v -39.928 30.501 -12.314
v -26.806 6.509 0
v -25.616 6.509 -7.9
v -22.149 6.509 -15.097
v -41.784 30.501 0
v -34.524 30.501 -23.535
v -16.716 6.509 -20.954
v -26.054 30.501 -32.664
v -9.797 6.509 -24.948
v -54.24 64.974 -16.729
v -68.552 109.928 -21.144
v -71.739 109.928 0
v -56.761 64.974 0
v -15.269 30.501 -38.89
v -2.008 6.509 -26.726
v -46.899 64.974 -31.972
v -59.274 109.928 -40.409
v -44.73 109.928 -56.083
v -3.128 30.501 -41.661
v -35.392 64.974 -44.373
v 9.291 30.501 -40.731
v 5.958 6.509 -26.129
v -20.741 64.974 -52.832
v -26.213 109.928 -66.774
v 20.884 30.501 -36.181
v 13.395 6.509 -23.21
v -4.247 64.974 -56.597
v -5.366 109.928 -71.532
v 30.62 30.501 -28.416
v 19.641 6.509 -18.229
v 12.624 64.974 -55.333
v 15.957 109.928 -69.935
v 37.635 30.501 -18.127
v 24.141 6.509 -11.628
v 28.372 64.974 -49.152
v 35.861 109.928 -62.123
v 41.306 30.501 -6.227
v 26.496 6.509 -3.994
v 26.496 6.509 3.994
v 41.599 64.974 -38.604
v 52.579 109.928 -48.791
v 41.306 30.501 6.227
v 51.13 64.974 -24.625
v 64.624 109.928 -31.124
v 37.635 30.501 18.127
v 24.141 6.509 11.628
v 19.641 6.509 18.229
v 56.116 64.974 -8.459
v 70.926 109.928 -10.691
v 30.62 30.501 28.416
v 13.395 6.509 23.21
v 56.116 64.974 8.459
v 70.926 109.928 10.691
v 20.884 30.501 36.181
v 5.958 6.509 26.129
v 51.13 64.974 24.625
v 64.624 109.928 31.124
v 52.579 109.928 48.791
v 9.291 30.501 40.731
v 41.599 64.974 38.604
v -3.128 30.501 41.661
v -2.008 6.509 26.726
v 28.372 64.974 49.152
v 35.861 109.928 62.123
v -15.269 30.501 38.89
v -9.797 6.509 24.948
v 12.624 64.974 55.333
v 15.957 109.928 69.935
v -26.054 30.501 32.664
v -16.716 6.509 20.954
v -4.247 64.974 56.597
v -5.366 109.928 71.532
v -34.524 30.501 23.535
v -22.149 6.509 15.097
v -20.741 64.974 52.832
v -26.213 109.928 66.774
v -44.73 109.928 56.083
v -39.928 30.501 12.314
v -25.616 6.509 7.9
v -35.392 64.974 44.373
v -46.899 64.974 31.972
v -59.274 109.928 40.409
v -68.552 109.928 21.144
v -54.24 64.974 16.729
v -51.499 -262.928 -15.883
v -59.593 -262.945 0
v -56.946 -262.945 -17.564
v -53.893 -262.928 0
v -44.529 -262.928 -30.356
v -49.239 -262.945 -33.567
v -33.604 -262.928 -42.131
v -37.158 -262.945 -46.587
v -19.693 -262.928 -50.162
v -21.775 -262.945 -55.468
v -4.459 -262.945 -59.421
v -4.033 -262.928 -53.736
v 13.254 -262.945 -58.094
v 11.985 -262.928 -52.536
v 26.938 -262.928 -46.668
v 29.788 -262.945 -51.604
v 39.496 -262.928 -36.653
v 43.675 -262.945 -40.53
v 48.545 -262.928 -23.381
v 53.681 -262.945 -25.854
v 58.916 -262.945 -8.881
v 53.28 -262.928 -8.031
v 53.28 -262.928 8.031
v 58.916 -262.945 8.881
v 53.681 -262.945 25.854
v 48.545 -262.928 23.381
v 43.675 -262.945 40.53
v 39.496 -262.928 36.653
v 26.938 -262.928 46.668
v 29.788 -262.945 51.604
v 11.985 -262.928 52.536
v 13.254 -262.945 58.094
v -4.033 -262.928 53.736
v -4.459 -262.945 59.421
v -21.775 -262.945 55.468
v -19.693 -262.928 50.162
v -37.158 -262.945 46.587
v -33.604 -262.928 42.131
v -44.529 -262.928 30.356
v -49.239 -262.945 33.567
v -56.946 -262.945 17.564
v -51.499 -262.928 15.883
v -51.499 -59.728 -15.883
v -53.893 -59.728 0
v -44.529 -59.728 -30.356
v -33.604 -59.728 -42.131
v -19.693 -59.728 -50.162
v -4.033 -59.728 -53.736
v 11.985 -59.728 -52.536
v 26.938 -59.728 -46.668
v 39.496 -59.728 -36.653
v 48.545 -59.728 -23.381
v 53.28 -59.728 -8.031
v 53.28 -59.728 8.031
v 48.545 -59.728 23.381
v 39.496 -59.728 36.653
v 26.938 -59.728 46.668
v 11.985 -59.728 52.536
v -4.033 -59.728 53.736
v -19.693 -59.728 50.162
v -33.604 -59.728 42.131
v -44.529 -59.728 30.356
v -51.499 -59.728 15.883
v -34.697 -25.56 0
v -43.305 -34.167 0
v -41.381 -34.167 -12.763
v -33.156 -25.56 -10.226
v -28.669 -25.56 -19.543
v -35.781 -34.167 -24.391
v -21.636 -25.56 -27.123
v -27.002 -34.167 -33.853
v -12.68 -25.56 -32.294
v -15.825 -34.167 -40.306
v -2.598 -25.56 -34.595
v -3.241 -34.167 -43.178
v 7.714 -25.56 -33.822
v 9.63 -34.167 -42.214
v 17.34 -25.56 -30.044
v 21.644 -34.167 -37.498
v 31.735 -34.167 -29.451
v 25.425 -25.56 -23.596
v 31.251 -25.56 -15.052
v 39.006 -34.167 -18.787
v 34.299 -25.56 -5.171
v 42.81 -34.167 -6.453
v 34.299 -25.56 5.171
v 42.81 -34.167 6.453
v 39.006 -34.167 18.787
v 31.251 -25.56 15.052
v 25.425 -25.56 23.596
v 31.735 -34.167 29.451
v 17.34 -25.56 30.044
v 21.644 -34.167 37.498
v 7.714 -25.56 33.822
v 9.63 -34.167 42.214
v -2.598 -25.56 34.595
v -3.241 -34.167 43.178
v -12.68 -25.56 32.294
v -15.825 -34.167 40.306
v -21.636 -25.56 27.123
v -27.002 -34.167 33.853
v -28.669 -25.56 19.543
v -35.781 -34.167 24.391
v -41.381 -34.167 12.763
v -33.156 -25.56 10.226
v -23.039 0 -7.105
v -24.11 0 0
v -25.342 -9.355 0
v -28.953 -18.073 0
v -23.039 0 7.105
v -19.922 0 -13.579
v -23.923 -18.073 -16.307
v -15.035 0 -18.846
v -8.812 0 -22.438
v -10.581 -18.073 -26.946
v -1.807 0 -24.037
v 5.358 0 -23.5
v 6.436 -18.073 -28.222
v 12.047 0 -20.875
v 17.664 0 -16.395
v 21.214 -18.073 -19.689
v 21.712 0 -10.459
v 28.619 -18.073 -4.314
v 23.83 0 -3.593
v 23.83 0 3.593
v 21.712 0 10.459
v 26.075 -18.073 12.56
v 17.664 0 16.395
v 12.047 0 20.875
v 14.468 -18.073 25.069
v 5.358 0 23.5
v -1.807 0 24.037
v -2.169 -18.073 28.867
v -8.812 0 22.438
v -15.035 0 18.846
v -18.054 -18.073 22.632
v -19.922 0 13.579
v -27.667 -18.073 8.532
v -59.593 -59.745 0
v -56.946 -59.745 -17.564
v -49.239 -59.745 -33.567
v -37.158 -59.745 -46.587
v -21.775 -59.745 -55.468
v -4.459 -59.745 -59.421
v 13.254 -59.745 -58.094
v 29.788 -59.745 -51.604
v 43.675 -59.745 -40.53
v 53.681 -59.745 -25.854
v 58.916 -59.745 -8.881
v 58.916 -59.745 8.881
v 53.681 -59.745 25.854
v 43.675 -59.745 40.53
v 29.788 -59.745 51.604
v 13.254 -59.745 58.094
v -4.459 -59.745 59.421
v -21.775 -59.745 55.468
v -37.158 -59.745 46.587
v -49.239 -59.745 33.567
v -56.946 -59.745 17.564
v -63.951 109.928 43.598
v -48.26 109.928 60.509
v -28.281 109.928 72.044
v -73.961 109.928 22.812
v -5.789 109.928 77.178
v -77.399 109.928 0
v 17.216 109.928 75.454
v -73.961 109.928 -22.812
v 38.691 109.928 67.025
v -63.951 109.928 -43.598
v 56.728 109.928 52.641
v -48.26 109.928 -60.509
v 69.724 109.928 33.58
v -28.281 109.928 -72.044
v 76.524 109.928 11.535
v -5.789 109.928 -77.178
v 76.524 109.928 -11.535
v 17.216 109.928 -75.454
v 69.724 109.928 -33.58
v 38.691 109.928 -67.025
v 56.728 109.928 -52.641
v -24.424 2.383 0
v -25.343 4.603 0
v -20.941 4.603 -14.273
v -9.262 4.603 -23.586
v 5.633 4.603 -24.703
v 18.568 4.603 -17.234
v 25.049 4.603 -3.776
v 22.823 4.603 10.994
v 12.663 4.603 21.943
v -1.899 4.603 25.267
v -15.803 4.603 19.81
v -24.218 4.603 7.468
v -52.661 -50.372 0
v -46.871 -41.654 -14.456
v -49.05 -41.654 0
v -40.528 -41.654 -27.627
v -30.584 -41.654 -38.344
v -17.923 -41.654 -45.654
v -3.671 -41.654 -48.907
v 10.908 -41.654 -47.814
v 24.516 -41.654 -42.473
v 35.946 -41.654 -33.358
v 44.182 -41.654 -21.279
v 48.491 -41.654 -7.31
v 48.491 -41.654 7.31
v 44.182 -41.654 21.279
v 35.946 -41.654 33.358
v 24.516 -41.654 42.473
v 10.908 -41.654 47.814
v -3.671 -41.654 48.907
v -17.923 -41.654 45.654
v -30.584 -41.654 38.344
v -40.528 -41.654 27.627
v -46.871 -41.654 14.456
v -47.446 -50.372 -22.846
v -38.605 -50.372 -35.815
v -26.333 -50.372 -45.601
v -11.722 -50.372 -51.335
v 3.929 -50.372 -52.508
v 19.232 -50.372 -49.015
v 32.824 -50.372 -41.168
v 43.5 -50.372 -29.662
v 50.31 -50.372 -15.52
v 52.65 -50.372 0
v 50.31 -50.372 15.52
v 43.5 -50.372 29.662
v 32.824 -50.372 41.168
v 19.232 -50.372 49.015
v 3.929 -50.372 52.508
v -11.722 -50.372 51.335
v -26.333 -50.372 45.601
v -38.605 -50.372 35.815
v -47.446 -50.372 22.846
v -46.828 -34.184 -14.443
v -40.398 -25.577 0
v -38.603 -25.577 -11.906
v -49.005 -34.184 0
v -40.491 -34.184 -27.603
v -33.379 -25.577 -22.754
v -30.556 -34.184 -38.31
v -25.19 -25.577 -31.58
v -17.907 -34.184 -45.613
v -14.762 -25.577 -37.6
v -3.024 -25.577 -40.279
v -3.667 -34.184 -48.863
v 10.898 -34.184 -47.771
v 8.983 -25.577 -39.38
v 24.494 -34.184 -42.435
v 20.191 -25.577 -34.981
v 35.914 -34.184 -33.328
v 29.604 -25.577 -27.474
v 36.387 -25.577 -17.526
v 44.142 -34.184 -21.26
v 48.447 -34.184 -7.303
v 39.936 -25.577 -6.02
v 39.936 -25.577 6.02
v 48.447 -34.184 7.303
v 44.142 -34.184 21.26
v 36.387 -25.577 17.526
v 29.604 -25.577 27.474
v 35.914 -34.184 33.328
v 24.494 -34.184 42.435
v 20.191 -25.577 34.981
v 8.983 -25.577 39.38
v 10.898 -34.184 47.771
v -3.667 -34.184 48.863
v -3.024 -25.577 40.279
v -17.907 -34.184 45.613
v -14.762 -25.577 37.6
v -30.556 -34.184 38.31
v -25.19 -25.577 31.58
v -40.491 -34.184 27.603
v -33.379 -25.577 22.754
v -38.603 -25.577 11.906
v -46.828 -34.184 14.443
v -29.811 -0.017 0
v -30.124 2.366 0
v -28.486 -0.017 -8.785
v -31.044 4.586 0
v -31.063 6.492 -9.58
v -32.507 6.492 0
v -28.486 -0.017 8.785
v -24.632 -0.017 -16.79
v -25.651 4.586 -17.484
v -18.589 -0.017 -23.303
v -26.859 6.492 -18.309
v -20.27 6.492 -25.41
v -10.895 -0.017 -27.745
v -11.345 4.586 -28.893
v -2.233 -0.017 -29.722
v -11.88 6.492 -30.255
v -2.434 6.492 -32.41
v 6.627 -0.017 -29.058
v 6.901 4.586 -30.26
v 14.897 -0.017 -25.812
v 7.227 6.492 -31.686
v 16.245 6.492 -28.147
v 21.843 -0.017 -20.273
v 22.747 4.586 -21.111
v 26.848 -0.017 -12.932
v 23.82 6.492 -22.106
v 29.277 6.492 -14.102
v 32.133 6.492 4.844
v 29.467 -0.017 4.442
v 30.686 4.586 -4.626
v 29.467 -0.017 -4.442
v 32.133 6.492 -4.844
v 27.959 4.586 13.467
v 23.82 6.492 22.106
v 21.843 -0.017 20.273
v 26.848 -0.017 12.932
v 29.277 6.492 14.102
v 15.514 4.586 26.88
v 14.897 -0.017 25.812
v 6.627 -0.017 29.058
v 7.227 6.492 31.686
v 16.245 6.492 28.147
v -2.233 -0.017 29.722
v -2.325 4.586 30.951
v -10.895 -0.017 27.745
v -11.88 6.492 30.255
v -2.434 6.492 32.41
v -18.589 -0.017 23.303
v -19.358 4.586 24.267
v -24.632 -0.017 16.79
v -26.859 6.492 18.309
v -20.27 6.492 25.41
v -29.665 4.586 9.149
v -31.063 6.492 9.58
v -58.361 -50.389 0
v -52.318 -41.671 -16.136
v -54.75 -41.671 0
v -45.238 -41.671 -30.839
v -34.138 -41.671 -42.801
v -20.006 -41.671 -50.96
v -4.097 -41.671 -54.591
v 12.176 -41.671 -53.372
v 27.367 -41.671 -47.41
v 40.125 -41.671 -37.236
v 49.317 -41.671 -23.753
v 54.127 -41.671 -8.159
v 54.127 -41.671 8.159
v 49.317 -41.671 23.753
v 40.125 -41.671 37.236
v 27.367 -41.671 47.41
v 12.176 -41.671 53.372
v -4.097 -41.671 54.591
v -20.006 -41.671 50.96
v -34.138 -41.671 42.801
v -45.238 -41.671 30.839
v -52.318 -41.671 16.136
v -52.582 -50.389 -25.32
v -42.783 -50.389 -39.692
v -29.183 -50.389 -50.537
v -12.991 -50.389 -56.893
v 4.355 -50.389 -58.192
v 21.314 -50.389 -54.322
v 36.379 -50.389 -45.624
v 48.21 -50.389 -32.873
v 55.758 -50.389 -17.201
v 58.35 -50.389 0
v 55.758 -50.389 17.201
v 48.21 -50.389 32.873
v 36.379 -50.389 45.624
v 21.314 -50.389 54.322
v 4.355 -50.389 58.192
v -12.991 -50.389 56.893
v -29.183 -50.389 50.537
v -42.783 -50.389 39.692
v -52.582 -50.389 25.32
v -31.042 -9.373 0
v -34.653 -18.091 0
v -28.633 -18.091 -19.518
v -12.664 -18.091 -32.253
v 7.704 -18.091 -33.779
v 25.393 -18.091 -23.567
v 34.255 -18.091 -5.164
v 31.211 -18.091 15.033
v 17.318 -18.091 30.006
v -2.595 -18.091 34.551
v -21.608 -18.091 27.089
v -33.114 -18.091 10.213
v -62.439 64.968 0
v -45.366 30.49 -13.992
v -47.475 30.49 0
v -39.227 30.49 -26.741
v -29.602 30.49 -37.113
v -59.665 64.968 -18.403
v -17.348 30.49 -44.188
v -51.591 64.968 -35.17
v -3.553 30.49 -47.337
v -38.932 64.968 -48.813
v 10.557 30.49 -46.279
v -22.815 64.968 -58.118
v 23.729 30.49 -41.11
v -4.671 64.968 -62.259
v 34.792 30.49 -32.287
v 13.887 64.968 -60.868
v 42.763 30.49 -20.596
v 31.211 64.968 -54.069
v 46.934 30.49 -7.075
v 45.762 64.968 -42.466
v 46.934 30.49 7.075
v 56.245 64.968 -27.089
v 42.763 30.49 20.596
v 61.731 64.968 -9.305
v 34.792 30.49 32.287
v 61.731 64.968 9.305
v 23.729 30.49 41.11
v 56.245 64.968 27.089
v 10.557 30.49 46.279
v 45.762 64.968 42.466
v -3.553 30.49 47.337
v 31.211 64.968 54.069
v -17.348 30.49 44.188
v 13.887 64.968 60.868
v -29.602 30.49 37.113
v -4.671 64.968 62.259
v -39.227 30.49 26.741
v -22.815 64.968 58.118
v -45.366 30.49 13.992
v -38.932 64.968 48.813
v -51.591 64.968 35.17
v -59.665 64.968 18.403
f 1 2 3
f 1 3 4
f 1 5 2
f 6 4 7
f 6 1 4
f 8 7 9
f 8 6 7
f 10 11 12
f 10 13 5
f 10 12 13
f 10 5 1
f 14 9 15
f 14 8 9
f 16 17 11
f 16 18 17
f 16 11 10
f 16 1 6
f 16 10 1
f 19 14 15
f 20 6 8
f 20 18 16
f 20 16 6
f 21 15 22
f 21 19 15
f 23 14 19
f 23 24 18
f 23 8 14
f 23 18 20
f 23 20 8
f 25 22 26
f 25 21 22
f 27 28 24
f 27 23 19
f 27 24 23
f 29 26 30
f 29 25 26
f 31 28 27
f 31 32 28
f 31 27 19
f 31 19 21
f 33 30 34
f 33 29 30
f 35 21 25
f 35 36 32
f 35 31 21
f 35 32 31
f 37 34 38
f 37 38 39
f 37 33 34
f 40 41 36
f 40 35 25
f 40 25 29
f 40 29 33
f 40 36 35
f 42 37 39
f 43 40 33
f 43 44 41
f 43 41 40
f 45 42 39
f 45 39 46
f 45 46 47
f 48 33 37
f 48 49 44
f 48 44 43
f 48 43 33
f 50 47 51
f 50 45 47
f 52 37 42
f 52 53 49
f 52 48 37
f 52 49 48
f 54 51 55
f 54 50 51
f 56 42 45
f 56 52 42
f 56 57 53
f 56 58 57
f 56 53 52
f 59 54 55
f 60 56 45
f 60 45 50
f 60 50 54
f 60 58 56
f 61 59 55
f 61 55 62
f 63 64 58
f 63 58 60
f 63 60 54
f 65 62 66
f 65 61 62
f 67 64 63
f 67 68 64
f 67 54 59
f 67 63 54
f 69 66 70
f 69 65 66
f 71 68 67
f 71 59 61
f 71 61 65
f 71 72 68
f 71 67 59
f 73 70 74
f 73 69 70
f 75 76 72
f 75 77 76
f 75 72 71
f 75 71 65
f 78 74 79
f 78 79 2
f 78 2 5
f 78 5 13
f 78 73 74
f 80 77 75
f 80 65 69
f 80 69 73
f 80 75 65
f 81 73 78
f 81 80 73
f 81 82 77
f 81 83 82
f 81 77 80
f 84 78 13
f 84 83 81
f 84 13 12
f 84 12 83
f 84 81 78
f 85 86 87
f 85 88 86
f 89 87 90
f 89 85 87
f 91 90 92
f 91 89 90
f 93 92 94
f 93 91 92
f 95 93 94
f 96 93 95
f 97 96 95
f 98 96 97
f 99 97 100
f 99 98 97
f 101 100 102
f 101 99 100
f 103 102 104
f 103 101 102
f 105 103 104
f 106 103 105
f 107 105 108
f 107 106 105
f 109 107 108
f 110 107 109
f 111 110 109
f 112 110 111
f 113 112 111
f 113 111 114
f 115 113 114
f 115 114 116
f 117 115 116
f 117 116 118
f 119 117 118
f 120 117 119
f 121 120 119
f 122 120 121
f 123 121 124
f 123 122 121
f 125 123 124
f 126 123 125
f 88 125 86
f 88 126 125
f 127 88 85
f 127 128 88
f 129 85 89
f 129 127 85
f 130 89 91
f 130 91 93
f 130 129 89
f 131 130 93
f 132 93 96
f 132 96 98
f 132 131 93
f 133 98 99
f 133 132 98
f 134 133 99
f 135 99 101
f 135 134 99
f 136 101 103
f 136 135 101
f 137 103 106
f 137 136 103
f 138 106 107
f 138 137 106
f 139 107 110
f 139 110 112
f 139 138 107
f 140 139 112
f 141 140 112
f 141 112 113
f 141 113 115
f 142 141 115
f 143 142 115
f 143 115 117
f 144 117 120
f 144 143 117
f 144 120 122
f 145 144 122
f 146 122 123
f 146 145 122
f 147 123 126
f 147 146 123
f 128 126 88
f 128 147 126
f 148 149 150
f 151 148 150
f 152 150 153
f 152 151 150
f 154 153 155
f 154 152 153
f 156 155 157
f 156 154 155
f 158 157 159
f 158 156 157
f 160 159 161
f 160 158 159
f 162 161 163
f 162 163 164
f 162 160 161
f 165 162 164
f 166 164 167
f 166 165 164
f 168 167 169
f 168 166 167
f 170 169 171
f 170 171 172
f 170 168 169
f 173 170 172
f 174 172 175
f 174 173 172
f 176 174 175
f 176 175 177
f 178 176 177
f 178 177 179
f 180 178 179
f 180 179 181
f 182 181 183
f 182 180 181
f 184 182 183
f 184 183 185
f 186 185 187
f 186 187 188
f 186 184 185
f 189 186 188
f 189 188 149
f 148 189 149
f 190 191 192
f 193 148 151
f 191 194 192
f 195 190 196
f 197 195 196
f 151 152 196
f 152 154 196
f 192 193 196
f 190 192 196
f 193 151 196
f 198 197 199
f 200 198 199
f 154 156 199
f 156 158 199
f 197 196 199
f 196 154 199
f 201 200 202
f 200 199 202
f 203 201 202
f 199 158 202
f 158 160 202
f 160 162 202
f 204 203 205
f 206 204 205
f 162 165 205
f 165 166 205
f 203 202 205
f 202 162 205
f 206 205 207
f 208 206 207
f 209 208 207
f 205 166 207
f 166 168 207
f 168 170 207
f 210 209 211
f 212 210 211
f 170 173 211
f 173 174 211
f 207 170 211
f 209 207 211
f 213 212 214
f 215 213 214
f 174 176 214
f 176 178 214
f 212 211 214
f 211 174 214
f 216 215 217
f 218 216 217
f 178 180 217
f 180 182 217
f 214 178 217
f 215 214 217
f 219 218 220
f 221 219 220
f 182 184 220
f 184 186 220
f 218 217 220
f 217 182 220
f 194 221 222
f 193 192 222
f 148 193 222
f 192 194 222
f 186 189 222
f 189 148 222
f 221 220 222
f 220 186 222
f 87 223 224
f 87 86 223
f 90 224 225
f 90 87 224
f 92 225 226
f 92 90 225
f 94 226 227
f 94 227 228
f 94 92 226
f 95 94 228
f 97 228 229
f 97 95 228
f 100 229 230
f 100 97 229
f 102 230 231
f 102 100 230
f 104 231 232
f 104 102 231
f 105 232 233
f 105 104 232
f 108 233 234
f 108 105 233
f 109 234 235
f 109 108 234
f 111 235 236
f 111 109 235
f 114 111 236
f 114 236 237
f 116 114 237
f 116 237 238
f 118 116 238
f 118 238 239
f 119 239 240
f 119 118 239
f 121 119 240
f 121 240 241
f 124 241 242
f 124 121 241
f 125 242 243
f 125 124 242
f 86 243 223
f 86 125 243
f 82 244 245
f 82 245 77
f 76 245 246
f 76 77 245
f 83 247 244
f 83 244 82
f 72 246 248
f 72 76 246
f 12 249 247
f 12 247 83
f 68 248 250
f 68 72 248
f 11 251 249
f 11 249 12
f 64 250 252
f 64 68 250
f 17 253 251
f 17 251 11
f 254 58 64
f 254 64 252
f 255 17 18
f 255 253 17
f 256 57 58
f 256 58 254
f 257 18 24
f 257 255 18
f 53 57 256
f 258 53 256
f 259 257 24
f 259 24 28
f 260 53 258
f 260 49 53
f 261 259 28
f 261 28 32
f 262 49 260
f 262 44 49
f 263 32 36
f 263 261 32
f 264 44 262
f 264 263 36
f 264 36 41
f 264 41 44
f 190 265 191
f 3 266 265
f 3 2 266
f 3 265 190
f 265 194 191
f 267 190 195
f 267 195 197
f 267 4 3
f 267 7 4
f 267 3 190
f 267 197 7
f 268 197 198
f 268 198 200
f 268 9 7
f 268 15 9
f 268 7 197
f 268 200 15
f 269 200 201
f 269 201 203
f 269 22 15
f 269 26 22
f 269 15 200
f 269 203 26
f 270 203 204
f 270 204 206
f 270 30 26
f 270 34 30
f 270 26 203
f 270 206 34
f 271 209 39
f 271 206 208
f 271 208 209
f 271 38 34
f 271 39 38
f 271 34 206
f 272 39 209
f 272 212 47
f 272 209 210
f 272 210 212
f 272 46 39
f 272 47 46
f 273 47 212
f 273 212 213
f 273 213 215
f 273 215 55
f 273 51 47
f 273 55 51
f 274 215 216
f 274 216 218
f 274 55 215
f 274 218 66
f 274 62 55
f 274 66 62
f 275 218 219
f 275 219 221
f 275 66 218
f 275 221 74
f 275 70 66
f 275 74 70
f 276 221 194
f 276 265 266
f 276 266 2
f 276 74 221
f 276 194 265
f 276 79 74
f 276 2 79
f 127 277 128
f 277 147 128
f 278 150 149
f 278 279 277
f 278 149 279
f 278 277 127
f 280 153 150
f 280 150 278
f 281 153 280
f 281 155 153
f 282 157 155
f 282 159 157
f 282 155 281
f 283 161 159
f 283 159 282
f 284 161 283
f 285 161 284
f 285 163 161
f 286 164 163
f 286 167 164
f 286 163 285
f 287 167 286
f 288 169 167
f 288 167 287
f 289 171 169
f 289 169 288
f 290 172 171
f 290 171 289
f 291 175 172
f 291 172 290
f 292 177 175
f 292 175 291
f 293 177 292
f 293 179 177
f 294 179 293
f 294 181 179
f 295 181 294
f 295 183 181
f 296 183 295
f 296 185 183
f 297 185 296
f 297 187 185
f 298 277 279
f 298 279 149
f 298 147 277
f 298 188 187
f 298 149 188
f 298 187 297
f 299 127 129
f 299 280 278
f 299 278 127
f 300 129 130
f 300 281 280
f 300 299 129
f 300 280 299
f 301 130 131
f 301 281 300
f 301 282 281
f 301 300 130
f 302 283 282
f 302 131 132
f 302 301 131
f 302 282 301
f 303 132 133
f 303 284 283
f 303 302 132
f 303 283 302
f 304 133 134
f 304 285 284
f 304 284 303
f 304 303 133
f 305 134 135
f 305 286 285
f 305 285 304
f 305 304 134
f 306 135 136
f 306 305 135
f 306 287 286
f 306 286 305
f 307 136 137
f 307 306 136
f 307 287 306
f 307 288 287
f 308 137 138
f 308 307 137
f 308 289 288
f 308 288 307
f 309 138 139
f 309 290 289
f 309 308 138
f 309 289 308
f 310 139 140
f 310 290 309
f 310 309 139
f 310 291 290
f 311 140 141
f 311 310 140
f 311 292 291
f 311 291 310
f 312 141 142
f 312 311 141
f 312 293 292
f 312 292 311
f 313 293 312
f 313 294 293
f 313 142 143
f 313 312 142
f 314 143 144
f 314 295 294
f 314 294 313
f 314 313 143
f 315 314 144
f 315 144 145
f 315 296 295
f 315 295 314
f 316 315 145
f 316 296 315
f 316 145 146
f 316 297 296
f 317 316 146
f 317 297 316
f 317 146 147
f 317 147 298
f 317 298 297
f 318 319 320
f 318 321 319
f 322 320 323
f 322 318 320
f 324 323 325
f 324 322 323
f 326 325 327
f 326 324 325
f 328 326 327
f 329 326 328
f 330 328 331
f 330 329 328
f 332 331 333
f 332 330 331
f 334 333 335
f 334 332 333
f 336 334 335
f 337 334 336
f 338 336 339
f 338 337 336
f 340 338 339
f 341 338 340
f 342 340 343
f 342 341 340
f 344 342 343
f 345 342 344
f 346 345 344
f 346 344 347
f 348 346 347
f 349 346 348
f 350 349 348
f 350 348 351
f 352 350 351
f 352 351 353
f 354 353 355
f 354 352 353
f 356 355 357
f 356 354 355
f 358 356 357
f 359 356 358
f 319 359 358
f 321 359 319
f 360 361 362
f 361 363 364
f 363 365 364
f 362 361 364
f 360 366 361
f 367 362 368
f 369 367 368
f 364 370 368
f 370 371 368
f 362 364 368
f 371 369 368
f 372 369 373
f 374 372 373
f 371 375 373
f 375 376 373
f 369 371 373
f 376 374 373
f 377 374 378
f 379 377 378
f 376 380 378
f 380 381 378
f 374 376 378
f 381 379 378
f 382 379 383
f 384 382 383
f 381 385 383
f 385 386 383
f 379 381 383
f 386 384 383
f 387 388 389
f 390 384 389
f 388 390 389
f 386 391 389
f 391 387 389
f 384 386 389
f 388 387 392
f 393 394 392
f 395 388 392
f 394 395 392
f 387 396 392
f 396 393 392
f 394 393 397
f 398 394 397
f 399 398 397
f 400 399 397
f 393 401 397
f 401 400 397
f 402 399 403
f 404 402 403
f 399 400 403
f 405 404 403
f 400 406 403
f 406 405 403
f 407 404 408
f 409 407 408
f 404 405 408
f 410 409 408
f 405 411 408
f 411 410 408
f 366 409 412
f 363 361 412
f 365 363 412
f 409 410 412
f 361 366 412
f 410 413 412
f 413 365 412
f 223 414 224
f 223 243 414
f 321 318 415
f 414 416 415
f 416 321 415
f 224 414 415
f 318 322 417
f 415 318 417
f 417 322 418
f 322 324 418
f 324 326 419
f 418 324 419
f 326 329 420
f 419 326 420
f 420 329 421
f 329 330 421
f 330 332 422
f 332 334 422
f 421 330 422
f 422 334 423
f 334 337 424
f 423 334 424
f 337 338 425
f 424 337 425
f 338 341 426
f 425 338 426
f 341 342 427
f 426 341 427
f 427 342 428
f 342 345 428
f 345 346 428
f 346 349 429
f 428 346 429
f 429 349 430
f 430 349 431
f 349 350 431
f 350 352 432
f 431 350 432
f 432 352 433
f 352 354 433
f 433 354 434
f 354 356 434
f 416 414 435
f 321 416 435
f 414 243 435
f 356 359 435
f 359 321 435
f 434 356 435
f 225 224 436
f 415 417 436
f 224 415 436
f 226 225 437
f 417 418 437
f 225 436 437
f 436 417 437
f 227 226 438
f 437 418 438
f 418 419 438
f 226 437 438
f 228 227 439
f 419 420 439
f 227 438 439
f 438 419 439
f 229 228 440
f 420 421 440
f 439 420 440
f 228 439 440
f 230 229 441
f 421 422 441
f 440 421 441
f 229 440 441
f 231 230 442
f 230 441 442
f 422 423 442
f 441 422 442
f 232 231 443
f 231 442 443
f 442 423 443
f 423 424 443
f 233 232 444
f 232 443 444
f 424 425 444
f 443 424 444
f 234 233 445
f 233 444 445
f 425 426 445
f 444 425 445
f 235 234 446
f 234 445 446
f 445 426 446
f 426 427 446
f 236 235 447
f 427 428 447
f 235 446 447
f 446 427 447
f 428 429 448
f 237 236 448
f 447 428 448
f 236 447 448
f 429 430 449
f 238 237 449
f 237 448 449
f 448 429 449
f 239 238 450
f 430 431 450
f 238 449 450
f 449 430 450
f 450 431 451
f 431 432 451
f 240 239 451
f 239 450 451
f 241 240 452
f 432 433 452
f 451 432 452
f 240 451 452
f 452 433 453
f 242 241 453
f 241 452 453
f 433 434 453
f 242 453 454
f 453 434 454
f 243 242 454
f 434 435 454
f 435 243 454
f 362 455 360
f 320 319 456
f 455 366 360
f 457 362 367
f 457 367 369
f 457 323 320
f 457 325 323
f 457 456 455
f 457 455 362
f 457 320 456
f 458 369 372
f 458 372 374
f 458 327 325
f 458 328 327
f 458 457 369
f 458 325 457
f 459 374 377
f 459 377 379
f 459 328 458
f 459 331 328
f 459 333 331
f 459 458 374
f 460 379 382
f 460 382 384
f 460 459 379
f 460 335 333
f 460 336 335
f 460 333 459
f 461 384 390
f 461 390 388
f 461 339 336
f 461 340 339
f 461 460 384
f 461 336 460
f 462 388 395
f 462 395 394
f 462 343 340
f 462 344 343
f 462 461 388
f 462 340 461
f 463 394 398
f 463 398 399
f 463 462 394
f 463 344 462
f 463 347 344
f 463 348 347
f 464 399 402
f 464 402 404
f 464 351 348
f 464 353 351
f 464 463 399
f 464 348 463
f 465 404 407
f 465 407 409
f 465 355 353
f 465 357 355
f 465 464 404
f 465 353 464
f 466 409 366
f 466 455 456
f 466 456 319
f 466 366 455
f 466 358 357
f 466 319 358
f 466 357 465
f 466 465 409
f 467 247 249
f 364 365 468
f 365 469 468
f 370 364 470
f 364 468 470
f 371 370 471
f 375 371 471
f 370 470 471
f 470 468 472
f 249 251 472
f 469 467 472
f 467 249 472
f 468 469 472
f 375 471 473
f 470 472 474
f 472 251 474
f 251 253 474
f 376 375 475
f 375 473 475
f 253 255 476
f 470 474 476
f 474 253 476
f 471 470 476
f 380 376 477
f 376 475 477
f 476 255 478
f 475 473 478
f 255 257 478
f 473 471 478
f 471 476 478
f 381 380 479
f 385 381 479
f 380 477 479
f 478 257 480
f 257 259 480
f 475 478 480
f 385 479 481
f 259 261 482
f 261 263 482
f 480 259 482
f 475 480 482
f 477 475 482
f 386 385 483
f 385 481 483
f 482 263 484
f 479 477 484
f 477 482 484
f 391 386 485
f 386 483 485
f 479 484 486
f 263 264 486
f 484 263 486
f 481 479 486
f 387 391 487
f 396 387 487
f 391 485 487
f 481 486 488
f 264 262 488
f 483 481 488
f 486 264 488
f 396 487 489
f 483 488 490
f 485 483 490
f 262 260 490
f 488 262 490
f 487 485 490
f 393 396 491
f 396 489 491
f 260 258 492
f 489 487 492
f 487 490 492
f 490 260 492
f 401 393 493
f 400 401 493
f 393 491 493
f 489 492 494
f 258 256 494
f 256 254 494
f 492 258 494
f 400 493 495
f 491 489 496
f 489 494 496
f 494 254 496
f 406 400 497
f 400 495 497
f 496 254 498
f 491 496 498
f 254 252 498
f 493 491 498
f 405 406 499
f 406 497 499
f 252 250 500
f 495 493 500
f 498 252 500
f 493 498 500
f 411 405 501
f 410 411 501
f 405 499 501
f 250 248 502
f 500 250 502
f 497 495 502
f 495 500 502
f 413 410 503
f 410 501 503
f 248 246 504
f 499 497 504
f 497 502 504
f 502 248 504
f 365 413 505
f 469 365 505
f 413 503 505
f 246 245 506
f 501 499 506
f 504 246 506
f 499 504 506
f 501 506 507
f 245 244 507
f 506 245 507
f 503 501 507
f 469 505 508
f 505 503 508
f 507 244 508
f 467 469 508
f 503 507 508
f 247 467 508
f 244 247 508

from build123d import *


with BuildPart() as part:
    # Sketch1 → Revolve2 (revolve)
    with BuildSketch(Plane.XY, mode=Mode.PRIVATE) as revolve2_sk:
        with BuildLine():
            Line((71.727523603, 109.92750764), (77.388416165, 109.92750764))
            add(Edge.make_bspline(
                [(32.495712479, 6.492229985), (54.951080007, 34.627531396), (77.388416165, 109.92750764)],
                knots=[0, 0, 0, 1, 1, 1], degree=2))
            add(Edge.make_bspline(
                [(29.79950115, -0.017009666), (29.799501776, 0.018882986), (29.800039607, 0.093104024), (29.802456999, 0.250631404), (29.808894844, 0.410054451), (29.820966875, 0.629754601), (29.841868363, 0.884423662), (29.875617995, 1.185527607), (29.926932581, 1.525040832), (29.990976977, 1.863987111), (30.067574877, 2.199344754), (30.156756847, 2.532229755), (30.258174689, 2.861082979), (30.372052346, 3.186337375), (30.497630047, 3.506617491), (30.635719253, 3.822657067), (30.784503576, 4.132272519), (30.946445498, 4.437773457), (31.11692178, 4.73429191), (31.302947997, 5.028694196), (31.492221546, 5.30850927), (31.70483875, 5.593717877), (31.87930965, 5.815903982), (32.066779032, 6.032941971), (32.204988524, 6.19163198), (32.370875346, 6.365112113), (32.444953537, 6.441469176), (32.495712479, 6.492229985)],
                knots=[0.082568816, 0.082568816, 0.082568816, 0.082568816, 0.082568816, 0.102426634, 0.122284453, 0.142142271, 0.162000089, 0.201715725, 0.241431362, 0.281146998, 0.320862634, 0.360578271, 0.400293907, 0.440009544, 0.47972518, 0.519440816, 0.559156453, 0.598872089, 0.638587725, 0.678303362, 0.718018998, 0.757734635, 0.797450271, 0.837165907, 0.857023726, 0.876881544, 0.91659718, 0.91659718, 0.91659718, 0.91659718, 0.91659718], degree=4))
            add(Edge.make_bspline(
                [(29.79950115, -0.017009666), (29.799502381, -0.087538311), (29.800031528, -0.230593853), (29.802407213, -0.56019258), (29.808731607, -0.84117006), (29.818216728, -1.211831735), (29.830859021, -1.530444722), (29.846659245, -1.878949267), (29.865614504, -2.210716535), (29.893252118, -2.635079064), (29.932720324, -3.139043611), (30.003732985, -3.896988339), (30.123559956, -4.903460052), (30.299919323, -6.073720425), (30.551318512, -7.40217608), (30.852228593, -8.72058418), (31.202203904, -10.026646875), (31.600794265, -11.318829264), (32.047378674, -12.595109003), (32.541436606, -13.853897152), (33.082106405, -15.093206798), (33.668912671, -16.311619464), (34.300572682, -17.506948466), (34.976965681, -18.67829743), (35.695878388, -19.822753071), (36.458455286, -20.94086975), (37.15960048, -21.891421437), (37.789169411, -22.690455158), (38.324561704, -23.337431817), (38.772689056, -23.857014696), (39.208883315, -24.346825927), (39.63625941, -24.805494071), (39.945991929, -25.130877992), (40.237293247, -25.426658729), (40.336845715, -25.526959614), (40.386716092, -25.5768318)],
                knots=[0.082637729, 0.082637729, 0.082637729, 0.082637729, 0.082637729, 0.092574926, 0.102512123, 0.11244932, 0.122386517, 0.132323714, 0.142260911, 0.152198108, 0.162135305, 0.182009699, 0.201884093, 0.24163288, 0.281381668, 0.321130456, 0.360879243, 0.400628031, 0.440376819, 0.480125606, 0.519874394, 0.559623181, 0.599371969, 0.639120757, 0.678869544, 0.718618332, 0.75836712, 0.798115907, 0.817990301, 0.837864695, 0.857739089, 0.877613483, 0.897487877, 0.907425074, 0.91736227, 0.91736227, 0.91736227, 0.91736227, 0.91736227], degree=4))
            Line((40.386716092, -25.5768318), (48.994344291, -34.184459998))
            add(Edge.make_bspline(
                [(59.581960968, -59.744683548), (59.581959736, -59.674153485), (59.581430593, -59.532576432), (59.579054743, -59.198734945), (59.572730144, -58.921965822), (59.563244656, -58.549737817), (59.550601759, -58.230007951), (59.530850931, -57.798764772), (59.500838589, -57.298130228), (59.456626426, -56.705168494), (59.377721756, -55.865650695), (59.277860165, -55.025336189), (59.157109089, -54.189605759), (58.987244125, -53.189595569), (58.792497489, -52.194613151), (58.566808422, -51.205709413), (58.310447525, -50.224659368), (58.029722641, -49.25024807), (57.724782039, -48.283139554), (57.33397113, -47.166305397), (56.839953659, -45.907578736), (56.29916705, -44.668139134), (55.712494225, -43.449871857), (55.080553527, -42.25426357), (54.404558525, -41.083325211), (53.684908815, -39.938142989), (52.923535432, -38.821246572), (52.220302354, -37.868622118), (51.593971231, -37.072842456), (51.053250974, -36.420551616), (50.615560241, -35.911417966), (50.215209482, -35.464162991), (49.881890795, -35.101801519), (49.574357917, -34.777510486), (49.374505699, -34.568719785), (49.144825365, -34.335686622), (49.044216443, -34.23433239), (48.994344291, -34.184459998)],
                knots=[0.082637729, 0.082637729, 0.082637729, 0.082637729, 0.082637729, 0.092574926, 0.102512123, 0.11244932, 0.122386517, 0.132323714, 0.142260911, 0.162135305, 0.182009699, 0.201884093, 0.24163288, 0.261507274, 0.281381668, 0.321130456, 0.360879243, 0.380753637, 0.400628031, 0.440376819, 0.480125606, 0.519874394, 0.559623181, 0.599371969, 0.639120757, 0.678869544, 0.718618332, 0.75836712, 0.798115907, 0.817990301, 0.837864695, 0.857739089, 0.877613483, 0.88755068, 0.897487877, 0.907425074, 0.91736227, 0.91736227, 0.91736227, 0.91736227, 0.91736227], degree=4))
            Line((59.581960968, -59.744683548), (59.581960968, -262.944683548))
            Line((59.581960968, -262.944683548), (53.881527661, -262.927513222))
            Line((53.881527661, -262.927513222), (53.881527661, -59.727513222))
            add(Edge.make_bspline(
                [(53.881527661, -59.727513222), (53.88152643, -59.65698316), (53.880997287, -59.515406106), (53.878621437, -59.18156462), (53.872296838, -58.904795496), (53.862811351, -58.532567491), (53.850168454, -58.212837625), (53.830417626, -57.781594446), (53.800405285, -57.280959903), (53.756193122, -56.687998169), (53.677288452, -55.848480369), (53.577426862, -55.008165864), (53.456675787, -54.172435434), (53.286810823, -53.172425243), (53.092064188, -52.177442825), (52.866375121, -51.188539087), (52.610014225, -50.207489042), (52.329289341, -49.233077744), (52.02434874, -48.265969227), (51.633537832, -47.14913507), (51.139520362, -45.890408409), (50.598733754, -44.650968807), (50.012060929, -43.432701529), (49.380120232, -42.237093242), (48.70412523, -41.066154882), (47.984475521, -39.92097266), (47.22310214, -38.804076242), (46.519869062, -37.851451788), (45.893537939, -37.055672125), (45.352817683, -36.403381285), (44.91512695, -35.894247635), (44.514776192, -35.44699266), (44.181457505, -35.084631188), (43.873924626, -34.760340154), (43.674072409, -34.551549453), (43.444392075, -34.31851629), (43.343783154, -34.217162058), (43.293911001, -34.167289665)],
                knots=[0.082637729, 0.082637729, 0.082637729, 0.082637729, 0.082637729, 0.092574926, 0.102512123, 0.11244932, 0.122386517, 0.132323714, 0.142260911, 0.162135305, 0.182009699, 0.201884093, 0.24163288, 0.261507274, 0.281381668, 0.321130456, 0.360879243, 0.380753637, 0.400628031, 0.440376819, 0.480125606, 0.519874394, 0.559623181, 0.599371969, 0.639120757, 0.678869544, 0.718618332, 0.75836712, 0.798115907, 0.817990301, 0.837864695, 0.857739089, 0.877613483, 0.88755068, 0.897487877, 0.907425074, 0.91736227, 0.91736227, 0.91736227, 0.91736227, 0.91736227], degree=4))
            Line((43.293911001, -34.167289665), (34.686282803, -25.559661467))
            add(Edge.make_bspline(
                [(24.099067874, 0.000160672), (24.099069105, -0.070367973), (24.099598252, -0.213423515), (24.101973937, -0.543022242), (24.108298331, -0.823999722), (24.117783452, -1.194661397), (24.130425744, -1.513274384), (24.146225968, -1.861778929), (24.165181227, -2.193546197), (24.19281884, -2.617908726), (24.232287047, -3.121873273), (24.303299707, -3.879818001), (24.423126678, -4.886289715), (24.599486043, -6.056550087), (24.850885233, -7.385005742), (25.151795313, -8.703413843), (25.501770623, -10.009476538), (25.900360983, -11.301658927), (26.346945391, -12.577938666), (26.841003322, -13.836726816), (27.381673121, -15.076036462), (27.968479386, -16.294449128), (28.600139397, -17.48977813), (29.276532395, -18.661127095), (29.995445101, -19.805582736), (30.758021999, -20.923699416), (31.459167192, -21.874251103), (32.088736122, -22.673284825), (32.624128416, -23.320261484), (33.072255767, -23.839844363), (33.508450026, -24.329655594), (33.935826121, -24.788323738), (34.245558639, -25.113707659), (34.536859957, -25.409488397), (34.636412425, -25.509789282), (34.686282803, -25.559661467)],
                knots=[0.082637729, 0.082637729, 0.082637729, 0.082637729, 0.082637729, 0.092574926, 0.102512123, 0.11244932, 0.122386517, 0.132323714, 0.142260911, 0.152198108, 0.162135305, 0.182009699, 0.201884093, 0.24163288, 0.281381668, 0.321130456, 0.360879243, 0.400628031, 0.440376819, 0.480125606, 0.519874394, 0.559623181, 0.599371969, 0.639120757, 0.678869544, 0.718618332, 0.75836712, 0.798115907, 0.817990301, 0.837864695, 0.857739089, 0.877613483, 0.897487877, 0.907425074, 0.91736227, 0.91736227, 0.91736227, 0.91736227, 0.91736227], degree=4))
            add(Edge.make_bspline(
                [(24.099067874, 0.000160672), (24.0990685, 0.036053324), (24.099606331, 0.110274362), (24.102023723, 0.267801742), (24.108461568, 0.427224789), (24.120533599, 0.646924939), (24.141435087, 0.901594), (24.175184719, 1.202697945), (24.226499305, 1.54221117), (24.290543701, 1.881157449), (24.367141601, 2.216515092), (24.456323571, 2.549400093), (24.557741413, 2.878253317), (24.671619071, 3.203507713), (24.797196771, 3.523787829), (24.935285977, 3.839827405), (25.084070301, 4.149442857), (25.246012222, 4.454943795), (25.416488505, 4.751462248), (25.602514721, 5.045864533), (25.79178827, 5.325679608), (26.004405474, 5.610888215), (26.178876374, 5.83307432), (26.366345756, 6.050112309), (26.504555248, 6.208802318), (26.67044207, 6.382282451), (26.744520261, 6.458639514), (26.795279203, 6.509400323)],
                knots=[0.082568816, 0.082568816, 0.082568816, 0.082568816, 0.082568816, 0.102426634, 0.122284453, 0.142142271, 0.162000089, 0.201715725, 0.241431362, 0.281146998, 0.320862634, 0.360578271, 0.400293907, 0.440009544, 0.47972518, 0.519440816, 0.559156453, 0.598872089, 0.638587725, 0.678303362, 0.718018998, 0.757734635, 0.797450271, 0.837165907, 0.857023726, 0.876881544, 0.91659718, 0.91659718, 0.91659718, 0.91659718, 0.91659718], degree=4))
            add(Edge.make_bspline(
                [(26.795279203, 6.509400323), (49.261401403, 34.636114842), (71.727523603, 109.92750764)],
                knots=[0, 0, 0, 1, 1, 1], degree=2))
        make_face()
    revolve(revolve2_sk.sketch.rotate(Axis((-0.005532126, 165.815985114, 0), (0, -1, 0)), 180), axis=Axis((-0.005532126, 165.815985114, 0), (0, -1, 0)))


solid = part.part
